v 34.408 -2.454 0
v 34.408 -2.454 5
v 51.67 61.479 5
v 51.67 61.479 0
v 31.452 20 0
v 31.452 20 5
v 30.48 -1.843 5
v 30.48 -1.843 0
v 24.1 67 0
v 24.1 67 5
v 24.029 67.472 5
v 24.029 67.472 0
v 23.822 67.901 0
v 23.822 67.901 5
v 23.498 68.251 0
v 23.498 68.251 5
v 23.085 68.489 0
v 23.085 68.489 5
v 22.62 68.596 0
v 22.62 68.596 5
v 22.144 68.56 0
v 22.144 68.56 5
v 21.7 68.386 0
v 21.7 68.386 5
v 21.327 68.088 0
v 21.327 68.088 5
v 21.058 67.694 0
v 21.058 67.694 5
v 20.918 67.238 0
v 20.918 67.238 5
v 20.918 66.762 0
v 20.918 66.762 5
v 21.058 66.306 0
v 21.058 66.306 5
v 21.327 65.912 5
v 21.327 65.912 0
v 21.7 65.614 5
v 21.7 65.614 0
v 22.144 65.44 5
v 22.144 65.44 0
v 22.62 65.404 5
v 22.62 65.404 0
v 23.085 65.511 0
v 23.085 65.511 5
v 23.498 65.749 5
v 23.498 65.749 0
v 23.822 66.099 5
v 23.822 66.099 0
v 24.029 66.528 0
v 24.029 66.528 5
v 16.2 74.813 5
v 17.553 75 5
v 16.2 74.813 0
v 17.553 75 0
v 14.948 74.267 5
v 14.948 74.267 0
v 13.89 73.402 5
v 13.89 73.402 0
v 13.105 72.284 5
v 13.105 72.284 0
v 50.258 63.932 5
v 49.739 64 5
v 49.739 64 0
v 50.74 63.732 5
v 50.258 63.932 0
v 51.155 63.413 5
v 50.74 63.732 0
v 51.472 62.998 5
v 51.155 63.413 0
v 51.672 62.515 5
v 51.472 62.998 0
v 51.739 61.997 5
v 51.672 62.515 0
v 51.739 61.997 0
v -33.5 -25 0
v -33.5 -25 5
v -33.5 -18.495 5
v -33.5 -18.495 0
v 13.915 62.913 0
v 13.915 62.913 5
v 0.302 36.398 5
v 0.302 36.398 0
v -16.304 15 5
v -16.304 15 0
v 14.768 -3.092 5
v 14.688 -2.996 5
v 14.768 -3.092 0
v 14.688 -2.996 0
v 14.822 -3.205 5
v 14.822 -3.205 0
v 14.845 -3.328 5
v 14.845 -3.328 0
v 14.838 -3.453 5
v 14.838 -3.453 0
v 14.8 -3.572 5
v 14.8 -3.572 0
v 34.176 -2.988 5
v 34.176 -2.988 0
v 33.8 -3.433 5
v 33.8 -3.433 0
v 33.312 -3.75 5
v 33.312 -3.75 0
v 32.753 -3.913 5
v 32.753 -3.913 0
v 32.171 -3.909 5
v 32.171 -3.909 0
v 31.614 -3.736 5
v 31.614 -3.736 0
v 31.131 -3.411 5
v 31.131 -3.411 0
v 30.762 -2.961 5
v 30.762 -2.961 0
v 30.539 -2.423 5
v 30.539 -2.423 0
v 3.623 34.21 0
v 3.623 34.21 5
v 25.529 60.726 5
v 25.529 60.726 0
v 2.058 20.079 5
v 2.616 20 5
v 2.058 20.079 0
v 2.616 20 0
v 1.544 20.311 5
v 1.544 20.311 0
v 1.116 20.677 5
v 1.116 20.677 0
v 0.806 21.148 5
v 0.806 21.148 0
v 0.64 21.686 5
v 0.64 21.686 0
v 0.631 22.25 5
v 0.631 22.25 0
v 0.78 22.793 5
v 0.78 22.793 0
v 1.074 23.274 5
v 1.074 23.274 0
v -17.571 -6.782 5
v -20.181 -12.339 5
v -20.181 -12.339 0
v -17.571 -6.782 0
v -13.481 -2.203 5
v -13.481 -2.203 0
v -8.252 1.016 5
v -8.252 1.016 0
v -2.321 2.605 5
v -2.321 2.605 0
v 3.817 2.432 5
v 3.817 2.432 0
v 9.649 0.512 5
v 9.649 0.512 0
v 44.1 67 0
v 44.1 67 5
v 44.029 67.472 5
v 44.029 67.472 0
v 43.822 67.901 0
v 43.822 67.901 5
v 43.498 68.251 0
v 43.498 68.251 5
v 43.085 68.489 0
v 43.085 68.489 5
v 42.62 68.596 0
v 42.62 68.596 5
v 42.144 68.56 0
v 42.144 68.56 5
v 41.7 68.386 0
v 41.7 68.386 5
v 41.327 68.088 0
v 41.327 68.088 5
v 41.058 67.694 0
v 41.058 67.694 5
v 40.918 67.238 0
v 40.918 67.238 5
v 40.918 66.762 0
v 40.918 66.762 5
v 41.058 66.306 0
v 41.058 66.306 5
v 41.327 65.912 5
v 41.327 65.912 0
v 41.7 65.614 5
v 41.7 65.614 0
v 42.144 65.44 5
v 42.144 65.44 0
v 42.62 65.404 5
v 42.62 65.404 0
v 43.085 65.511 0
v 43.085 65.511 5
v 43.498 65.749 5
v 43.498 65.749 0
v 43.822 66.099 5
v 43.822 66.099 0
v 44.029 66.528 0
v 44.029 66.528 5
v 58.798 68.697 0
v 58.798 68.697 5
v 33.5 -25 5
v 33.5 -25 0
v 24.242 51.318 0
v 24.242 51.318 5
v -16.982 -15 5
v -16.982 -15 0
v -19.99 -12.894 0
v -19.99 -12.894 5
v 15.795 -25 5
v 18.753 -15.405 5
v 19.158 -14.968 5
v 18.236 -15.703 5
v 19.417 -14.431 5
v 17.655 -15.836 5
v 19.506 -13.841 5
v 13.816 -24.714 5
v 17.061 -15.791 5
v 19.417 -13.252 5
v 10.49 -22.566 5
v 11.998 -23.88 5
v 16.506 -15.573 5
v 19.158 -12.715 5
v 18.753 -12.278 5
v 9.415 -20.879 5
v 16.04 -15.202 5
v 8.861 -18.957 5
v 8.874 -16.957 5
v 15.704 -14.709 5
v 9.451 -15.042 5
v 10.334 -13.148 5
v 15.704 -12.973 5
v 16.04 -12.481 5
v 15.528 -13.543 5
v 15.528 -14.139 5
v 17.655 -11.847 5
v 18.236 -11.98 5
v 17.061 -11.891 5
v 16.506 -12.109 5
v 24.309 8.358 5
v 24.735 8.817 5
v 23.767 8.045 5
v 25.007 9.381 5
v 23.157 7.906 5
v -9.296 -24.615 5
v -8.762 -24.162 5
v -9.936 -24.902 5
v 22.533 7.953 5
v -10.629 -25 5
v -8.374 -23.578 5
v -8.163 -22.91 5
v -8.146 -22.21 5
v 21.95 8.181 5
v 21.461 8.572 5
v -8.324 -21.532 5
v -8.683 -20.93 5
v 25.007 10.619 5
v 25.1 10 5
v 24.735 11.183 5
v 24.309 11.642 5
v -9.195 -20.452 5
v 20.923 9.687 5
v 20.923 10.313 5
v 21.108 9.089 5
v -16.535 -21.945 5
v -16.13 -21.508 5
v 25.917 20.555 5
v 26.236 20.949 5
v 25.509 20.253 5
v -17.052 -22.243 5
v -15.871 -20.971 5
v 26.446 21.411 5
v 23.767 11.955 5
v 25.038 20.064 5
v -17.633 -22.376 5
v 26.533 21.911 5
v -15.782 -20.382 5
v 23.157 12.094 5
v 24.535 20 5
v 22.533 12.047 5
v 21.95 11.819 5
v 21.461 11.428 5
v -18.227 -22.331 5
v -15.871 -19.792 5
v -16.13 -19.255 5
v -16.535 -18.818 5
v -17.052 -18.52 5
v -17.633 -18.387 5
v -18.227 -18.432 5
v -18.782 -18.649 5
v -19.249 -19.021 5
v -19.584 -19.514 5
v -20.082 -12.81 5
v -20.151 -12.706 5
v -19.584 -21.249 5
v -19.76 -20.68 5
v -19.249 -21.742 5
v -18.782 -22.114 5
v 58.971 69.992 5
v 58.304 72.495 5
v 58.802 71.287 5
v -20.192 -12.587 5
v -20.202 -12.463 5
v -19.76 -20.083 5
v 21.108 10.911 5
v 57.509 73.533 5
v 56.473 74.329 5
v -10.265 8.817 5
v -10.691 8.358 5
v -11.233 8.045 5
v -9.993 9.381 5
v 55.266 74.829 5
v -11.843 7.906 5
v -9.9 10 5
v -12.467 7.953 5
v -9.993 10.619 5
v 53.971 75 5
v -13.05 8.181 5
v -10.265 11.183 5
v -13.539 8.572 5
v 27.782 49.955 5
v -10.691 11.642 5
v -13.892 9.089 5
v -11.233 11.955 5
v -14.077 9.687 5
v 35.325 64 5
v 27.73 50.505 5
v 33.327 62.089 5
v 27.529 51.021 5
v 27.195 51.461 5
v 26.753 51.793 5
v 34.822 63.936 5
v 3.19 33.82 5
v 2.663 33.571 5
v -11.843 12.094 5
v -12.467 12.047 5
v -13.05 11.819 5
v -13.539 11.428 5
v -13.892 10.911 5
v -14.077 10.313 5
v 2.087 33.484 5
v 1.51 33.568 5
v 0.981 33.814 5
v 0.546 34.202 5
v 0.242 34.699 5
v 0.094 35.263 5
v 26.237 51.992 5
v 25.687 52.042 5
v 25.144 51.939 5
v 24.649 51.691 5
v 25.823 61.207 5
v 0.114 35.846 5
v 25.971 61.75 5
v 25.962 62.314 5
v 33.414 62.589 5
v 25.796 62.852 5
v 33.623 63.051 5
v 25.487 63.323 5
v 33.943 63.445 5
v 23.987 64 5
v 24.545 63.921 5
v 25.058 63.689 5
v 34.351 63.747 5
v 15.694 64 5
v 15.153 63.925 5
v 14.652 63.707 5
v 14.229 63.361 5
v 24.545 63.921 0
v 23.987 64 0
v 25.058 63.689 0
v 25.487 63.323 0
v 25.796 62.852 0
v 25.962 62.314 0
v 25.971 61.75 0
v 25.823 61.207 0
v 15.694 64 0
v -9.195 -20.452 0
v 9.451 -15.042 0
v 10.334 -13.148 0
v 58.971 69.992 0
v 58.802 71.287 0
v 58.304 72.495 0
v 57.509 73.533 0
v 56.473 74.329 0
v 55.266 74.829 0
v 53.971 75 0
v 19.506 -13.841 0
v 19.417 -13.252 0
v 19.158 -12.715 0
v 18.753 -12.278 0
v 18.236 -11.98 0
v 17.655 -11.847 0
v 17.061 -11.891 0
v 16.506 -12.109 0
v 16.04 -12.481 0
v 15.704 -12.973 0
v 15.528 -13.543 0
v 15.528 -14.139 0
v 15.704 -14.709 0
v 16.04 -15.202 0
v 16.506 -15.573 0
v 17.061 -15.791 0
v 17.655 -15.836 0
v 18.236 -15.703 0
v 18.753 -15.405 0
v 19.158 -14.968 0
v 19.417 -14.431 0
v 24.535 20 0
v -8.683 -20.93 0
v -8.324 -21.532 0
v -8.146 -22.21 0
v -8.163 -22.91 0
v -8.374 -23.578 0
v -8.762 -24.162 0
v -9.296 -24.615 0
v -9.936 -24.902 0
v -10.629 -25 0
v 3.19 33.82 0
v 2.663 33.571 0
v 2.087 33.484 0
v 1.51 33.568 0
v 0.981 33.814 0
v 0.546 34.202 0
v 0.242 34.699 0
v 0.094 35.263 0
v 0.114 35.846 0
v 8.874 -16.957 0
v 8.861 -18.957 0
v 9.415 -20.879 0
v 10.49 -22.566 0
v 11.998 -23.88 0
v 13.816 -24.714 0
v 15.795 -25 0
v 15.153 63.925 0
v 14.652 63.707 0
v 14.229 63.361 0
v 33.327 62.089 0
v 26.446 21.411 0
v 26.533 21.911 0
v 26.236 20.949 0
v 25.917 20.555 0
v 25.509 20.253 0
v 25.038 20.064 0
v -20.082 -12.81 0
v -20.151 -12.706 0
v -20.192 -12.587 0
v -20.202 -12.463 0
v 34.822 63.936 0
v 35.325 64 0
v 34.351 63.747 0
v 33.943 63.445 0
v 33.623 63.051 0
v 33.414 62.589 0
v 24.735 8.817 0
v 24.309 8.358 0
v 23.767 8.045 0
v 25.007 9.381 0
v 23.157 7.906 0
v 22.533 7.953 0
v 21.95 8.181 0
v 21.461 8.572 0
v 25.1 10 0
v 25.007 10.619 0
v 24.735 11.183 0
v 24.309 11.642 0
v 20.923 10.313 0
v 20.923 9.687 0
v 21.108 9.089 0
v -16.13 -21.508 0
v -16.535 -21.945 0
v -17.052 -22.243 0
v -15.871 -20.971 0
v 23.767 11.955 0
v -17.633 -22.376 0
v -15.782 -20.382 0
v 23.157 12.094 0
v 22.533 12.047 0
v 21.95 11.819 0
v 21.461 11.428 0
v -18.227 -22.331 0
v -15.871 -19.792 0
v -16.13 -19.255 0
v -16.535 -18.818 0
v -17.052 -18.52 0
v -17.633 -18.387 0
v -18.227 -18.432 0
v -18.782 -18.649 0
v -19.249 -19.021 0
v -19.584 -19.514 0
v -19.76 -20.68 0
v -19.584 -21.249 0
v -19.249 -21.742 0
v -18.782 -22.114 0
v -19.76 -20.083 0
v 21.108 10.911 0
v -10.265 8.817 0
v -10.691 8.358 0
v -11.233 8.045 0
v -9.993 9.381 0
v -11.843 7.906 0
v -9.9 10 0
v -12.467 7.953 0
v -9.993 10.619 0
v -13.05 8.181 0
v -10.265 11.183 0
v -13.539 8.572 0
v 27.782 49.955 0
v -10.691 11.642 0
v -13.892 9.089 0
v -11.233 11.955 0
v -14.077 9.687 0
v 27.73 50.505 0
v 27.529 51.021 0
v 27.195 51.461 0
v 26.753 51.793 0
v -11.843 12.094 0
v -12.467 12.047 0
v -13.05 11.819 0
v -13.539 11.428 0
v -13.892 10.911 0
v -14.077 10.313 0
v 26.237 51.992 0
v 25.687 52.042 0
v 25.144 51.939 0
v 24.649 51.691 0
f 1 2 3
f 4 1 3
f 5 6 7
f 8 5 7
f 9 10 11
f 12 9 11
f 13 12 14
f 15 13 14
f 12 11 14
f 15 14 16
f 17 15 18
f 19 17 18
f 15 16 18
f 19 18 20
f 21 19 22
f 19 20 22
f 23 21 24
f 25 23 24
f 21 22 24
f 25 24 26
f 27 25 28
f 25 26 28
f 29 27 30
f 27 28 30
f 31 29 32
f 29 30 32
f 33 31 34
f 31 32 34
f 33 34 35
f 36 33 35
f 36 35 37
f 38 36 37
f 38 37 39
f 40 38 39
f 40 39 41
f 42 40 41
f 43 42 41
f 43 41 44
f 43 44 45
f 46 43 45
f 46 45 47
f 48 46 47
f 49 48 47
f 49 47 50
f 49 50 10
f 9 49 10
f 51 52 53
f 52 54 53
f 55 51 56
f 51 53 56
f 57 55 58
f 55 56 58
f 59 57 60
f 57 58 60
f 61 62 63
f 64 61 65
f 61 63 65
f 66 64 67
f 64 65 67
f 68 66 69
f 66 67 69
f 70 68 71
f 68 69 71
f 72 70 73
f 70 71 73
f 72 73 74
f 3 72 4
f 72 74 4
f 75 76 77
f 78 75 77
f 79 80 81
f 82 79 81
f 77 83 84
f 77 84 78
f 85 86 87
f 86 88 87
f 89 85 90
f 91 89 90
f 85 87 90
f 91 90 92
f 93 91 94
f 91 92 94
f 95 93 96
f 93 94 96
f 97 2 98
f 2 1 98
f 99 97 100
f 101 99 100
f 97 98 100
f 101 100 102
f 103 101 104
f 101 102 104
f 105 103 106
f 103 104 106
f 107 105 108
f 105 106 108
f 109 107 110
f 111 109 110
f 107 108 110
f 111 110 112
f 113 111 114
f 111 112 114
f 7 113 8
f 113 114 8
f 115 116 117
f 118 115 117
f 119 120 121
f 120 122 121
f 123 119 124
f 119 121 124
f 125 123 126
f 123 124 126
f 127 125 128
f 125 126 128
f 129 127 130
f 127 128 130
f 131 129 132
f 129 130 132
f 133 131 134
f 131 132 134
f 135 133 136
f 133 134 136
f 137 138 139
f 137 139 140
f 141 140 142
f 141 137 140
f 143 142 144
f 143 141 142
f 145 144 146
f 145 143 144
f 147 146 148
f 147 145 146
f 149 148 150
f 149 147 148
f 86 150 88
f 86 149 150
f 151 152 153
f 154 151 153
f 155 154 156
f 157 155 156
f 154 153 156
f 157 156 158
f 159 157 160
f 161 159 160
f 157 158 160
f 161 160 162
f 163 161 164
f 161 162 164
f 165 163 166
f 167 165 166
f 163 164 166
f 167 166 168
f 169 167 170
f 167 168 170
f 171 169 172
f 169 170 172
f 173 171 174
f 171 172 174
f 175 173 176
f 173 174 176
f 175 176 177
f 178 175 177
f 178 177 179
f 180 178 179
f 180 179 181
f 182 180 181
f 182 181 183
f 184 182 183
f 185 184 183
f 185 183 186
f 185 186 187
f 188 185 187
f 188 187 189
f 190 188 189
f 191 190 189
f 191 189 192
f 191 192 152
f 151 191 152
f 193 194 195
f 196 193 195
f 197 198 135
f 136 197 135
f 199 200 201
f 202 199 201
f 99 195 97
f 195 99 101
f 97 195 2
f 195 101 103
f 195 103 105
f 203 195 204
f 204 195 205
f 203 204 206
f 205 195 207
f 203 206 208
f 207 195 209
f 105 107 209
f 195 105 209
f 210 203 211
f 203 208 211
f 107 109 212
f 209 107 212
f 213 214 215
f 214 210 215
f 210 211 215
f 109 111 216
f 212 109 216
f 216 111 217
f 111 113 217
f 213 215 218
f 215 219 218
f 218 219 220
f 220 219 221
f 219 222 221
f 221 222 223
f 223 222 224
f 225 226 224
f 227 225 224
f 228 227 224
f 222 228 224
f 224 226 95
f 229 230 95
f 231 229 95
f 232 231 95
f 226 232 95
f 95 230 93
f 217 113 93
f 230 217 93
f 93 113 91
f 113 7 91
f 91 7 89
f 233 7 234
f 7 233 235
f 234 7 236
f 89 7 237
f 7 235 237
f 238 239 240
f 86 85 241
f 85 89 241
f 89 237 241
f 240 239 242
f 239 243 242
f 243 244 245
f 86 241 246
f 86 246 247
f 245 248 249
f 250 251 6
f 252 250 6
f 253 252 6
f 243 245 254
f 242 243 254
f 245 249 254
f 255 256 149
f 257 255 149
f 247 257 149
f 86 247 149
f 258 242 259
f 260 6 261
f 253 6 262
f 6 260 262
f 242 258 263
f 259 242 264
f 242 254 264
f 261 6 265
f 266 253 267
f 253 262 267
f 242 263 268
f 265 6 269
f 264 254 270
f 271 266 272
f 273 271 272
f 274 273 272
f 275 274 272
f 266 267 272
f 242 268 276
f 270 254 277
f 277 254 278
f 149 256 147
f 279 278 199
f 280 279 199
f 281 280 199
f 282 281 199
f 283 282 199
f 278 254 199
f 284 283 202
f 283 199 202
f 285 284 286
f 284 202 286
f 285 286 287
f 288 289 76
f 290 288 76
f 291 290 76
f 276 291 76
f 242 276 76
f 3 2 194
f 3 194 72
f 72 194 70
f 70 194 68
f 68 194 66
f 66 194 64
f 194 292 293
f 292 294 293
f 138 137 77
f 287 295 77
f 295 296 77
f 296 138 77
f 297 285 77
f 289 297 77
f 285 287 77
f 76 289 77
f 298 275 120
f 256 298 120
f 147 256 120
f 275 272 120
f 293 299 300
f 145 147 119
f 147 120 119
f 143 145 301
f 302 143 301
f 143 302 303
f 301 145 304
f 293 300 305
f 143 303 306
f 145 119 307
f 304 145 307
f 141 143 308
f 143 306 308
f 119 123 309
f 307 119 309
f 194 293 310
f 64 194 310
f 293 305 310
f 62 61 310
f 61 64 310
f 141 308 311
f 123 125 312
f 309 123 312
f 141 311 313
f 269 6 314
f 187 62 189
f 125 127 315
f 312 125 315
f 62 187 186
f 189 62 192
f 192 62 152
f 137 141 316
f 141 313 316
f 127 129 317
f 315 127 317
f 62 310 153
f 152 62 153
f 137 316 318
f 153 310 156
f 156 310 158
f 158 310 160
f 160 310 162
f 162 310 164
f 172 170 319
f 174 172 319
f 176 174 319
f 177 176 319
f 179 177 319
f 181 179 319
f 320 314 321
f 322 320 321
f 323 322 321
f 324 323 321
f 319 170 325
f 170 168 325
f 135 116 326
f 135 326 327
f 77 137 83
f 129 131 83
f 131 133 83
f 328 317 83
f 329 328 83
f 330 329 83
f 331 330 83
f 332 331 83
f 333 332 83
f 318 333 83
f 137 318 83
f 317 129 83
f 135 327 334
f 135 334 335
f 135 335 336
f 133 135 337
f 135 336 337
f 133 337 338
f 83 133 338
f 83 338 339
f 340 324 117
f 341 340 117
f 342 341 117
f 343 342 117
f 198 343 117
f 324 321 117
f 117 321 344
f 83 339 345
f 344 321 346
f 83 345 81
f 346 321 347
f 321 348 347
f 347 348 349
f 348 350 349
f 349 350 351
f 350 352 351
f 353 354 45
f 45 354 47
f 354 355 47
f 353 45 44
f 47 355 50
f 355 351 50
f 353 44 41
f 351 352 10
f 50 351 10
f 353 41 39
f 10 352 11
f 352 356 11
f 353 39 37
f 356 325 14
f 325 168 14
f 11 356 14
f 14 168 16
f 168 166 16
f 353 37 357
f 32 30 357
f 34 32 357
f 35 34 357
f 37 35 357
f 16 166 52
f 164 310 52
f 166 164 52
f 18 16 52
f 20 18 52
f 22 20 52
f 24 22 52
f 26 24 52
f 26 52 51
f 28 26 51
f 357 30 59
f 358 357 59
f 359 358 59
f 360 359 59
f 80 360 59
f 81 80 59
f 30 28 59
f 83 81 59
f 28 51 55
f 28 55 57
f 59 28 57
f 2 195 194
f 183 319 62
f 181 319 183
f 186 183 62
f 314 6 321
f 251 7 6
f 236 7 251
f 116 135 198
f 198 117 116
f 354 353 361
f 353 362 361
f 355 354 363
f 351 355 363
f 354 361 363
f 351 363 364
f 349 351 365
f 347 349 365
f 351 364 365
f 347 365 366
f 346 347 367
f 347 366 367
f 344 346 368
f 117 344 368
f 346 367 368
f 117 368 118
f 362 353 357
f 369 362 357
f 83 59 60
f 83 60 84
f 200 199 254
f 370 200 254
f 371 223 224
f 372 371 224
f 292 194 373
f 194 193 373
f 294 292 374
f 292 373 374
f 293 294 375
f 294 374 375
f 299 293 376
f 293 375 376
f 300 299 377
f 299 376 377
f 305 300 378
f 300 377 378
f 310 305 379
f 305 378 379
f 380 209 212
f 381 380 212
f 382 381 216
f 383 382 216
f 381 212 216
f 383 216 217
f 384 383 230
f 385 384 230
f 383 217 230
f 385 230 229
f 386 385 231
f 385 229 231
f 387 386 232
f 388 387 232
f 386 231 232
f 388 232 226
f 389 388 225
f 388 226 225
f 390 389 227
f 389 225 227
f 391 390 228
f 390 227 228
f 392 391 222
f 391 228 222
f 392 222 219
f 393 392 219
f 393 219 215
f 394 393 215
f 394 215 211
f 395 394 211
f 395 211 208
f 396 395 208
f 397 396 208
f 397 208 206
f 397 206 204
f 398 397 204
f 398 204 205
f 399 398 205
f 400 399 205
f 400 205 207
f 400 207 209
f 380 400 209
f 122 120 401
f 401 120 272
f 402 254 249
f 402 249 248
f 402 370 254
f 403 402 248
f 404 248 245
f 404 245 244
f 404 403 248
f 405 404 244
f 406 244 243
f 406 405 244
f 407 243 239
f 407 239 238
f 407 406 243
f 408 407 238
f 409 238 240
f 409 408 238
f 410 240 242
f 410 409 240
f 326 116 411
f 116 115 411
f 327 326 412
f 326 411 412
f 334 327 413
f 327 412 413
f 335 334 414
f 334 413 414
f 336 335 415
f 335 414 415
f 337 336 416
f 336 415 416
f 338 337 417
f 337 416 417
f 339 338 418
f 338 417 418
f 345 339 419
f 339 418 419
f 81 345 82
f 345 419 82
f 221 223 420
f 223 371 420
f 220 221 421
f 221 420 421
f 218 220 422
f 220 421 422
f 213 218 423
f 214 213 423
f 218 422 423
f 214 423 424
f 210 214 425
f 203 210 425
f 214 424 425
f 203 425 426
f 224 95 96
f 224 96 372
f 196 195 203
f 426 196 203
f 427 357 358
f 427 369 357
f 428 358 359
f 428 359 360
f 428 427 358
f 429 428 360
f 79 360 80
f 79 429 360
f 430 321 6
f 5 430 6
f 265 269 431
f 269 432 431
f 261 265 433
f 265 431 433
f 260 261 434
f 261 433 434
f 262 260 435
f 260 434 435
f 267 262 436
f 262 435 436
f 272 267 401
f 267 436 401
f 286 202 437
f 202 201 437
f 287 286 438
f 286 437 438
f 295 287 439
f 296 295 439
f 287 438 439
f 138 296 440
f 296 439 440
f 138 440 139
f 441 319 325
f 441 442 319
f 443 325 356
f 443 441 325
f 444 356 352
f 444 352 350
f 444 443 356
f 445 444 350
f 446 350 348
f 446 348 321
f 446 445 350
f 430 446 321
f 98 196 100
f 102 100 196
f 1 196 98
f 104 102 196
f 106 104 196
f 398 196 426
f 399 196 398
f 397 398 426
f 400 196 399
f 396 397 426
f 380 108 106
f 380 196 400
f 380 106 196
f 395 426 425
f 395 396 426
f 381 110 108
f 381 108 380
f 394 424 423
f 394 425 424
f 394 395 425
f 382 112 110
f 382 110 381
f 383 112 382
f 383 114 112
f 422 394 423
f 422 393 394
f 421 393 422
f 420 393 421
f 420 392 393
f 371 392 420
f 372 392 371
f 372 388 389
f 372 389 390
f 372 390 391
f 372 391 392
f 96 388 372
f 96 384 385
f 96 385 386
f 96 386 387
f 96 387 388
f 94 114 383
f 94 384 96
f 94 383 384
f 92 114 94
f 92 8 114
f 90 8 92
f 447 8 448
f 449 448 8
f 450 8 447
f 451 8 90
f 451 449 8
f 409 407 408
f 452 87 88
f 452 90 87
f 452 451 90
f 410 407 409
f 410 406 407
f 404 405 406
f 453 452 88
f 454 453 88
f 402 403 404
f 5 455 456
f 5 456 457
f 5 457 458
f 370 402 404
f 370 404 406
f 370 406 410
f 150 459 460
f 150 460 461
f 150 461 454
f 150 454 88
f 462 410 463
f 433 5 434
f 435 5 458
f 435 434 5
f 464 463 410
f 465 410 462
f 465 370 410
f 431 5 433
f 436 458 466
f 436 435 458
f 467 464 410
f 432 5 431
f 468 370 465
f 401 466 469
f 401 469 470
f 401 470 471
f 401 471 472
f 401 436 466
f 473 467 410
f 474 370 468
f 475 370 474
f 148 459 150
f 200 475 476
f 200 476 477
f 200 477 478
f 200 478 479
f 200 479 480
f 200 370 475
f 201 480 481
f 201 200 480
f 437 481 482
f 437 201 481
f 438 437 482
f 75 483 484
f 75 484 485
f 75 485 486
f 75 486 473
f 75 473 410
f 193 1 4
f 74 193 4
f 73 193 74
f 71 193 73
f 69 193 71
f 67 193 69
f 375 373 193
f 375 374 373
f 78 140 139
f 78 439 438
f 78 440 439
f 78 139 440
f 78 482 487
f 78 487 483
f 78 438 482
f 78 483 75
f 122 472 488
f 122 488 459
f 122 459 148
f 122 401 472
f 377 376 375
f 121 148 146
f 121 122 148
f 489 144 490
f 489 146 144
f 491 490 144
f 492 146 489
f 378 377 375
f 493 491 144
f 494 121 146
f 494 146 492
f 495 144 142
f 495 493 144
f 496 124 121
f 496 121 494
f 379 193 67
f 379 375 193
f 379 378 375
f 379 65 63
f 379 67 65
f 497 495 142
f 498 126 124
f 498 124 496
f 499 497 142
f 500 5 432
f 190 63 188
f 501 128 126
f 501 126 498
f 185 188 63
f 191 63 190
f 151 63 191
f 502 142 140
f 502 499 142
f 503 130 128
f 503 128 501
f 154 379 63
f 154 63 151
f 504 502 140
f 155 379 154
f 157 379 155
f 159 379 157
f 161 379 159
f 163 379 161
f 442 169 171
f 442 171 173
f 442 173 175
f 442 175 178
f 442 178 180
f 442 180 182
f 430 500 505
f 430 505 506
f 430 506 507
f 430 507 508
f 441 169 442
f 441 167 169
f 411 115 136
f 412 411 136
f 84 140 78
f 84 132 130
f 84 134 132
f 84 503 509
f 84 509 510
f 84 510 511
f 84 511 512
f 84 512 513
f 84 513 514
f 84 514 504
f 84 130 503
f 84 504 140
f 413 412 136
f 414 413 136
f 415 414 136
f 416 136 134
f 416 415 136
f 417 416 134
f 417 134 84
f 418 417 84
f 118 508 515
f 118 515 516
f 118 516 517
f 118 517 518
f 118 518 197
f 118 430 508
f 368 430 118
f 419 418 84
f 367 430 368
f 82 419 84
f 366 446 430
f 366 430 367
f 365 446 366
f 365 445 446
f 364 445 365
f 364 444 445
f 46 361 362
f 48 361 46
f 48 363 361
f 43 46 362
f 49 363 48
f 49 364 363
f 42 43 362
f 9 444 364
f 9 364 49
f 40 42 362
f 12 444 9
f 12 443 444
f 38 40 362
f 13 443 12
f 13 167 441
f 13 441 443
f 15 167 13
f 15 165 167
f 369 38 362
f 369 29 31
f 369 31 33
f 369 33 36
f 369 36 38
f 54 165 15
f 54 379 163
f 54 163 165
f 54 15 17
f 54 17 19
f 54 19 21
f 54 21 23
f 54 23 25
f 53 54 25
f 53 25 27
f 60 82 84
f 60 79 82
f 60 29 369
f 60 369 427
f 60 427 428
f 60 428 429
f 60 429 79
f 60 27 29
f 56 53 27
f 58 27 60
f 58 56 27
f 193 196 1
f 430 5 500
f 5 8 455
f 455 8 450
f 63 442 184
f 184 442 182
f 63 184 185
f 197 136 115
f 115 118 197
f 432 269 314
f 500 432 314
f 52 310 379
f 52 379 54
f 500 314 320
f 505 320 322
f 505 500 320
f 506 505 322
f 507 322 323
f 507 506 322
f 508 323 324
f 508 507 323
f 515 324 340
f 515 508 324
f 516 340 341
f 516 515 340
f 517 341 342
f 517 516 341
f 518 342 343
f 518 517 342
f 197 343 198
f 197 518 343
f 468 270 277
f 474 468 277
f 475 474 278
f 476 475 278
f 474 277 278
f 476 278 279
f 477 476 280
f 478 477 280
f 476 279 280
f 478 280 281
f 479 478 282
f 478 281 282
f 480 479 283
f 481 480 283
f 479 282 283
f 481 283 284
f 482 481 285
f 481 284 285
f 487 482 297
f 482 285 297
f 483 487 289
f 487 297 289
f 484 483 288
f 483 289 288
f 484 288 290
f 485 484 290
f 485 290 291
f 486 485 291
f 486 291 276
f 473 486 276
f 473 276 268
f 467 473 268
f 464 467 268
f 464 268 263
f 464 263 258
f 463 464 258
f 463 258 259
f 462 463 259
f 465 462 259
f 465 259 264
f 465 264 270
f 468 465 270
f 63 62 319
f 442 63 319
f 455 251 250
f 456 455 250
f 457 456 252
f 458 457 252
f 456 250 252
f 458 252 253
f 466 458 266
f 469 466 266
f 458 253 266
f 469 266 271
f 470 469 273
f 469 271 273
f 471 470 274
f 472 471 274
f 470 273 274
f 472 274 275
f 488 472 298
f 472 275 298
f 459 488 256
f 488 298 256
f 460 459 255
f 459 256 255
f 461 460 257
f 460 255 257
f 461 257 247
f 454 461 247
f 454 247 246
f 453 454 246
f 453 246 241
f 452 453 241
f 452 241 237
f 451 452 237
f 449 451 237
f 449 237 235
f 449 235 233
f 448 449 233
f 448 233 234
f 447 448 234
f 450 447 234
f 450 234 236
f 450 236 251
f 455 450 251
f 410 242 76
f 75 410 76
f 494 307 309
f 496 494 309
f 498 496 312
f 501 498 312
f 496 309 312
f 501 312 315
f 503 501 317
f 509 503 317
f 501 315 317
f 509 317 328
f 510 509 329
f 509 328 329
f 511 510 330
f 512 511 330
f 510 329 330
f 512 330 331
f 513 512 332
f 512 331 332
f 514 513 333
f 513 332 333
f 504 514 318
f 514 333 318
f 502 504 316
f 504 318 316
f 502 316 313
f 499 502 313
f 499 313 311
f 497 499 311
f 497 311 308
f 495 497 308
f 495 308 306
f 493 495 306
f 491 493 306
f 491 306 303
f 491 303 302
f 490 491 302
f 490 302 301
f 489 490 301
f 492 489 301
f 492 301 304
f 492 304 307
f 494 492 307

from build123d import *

# Parameters (mm, degrees)
SKETCH_1_W          = 67
SKETCH_1_H          = 30
EXTRUDE_1_DEPTH     = 5
SKETCH_3_R          = 11.5
CUT_EXTRUDE_1_DEPTH = 6
CUT_EXTRUDE_2_DEPTH = 5
EXTRUDE_2_DEPTH     = 5
FILLET_1_R          = 2.5
FILLET_3_R          = 0.5
FILLET_4_R          = 7
SKETCH_6_R          = 2
CUT_EXTRUDE_3_DEPTH = 6
EXTRUDE_3_DEPTH     = 5
CUT_EXTRUDE_4_DEPTH = 6
EXTRUDE_4_DEPTH     = 5
SKETCH_10_R         = 2.1
CUT_EXTRUDE_5_DEPTH = 6
FILLET_5_R          = 5
SKETCH_11_R         = 1.6
CUT_EXTRUDE_6_DEPTH = 6
CUT_EXTRUDE_7_DEPTH = 10
FILLET_6_R          = 2


with BuildPart() as part:
    # 草图1 → 凸台-拉伸1 (new body)
    with BuildSketch(Plane.XY):
        Rectangle(SKETCH_1_W, SKETCH_1_H)
    extrude(amount=EXTRUDE_1_DEPTH)

    # 草图3 → 切除-拉伸1 (cut, through all)
    with BuildSketch(Plane.XY.offset(5)):
        with Locations((0.155997342, -18.5)):
            Circle(SKETCH_3_R)
    extrude(amount=-CUT_EXTRUDE_1_DEPTH, mode=Mode.SUBTRACT)

    # 草图4 → 切除-拉伸2 (cut)
    with BuildSketch(Plane.XY.offset(5)):
        with BuildLine():
            Line((14.951296016, -3.246749948), (0.155997342, -34.975370344))
            Line((0.155997342, -34.975370344), (0.155997342, -27))
            Line((0.155997342, -27), (-20.283732192, -12.687947301))
            ThreePointArc((-20.283732192, -12.687947301), (-5.343907366, 2.025923809), (14.951296016, -3.246749948))
        make_face()
    extrude(amount=-CUT_EXTRUDE_2_DEPTH, mode=Mode.SUBTRACT)

    # 草图5 → 凸台-拉伸2 (add)
    with BuildSketch(Plane.XY.offset(5)):
        Polygon((-16.981778738, -15), (-2.700298671, -25), (-33.5, -25), (-33.5, -15), align=None)
        Polygon((33.5, -15), (33.5, -25), (4.807588927, -25), (10.334473164, -13.147558505), align=None)
    extrude(amount=-EXTRUDE_2_DEPTH)

    # 圆角1
    fillet_1_edges = [part.edges().sort_by_distance(p)[0] for p in [
        (-2.700298671, -25, 2.5),
    ]]
    fillet(fillet_1_edges, radius=FILLET_1_R)

    # 圆角3
    fillet_3_edges = [part.edges().sort_by_distance(p)[0] for p in [
        (14.951296016, -3.246749948, 2.5),
        (-20.283732192, -12.687947301, 2.5),
    ]]
    fillet(fillet_3_edges, radius=FILLET_3_R)

    # 圆角4
    fillet_4_edges = [part.edges().sort_by_distance(p)[0] for p in [
        (4.807588927, -25, 2.5),
    ]]
    fillet(fillet_4_edges, radius=FILLET_4_R)

    # 草图6 → 切除-拉伸3 (cut, through all)
    with BuildSketch(Plane.XY.offset(5)):
        with Locations((17.505658254, -13.841257188)):
            Circle(SKETCH_6_R)
        with Locations((-17.782400736, -20.381512339)):
            Circle(SKETCH_6_R)
    extrude(amount=-CUT_EXTRUDE_3_DEPTH, mode=Mode.SUBTRACT)

    # 草图7 → 凸台-拉伸3 (add)
    with BuildSketch(Plane.XY.offset(5)):
        Polygon((60.5, 75), (14.5, 75), (-16.303792618, 15), (33.5, 15), align=None)
    extrude(amount=-EXTRUDE_3_DEPTH)

    # 草图8 → 切除-拉伸4 (cut, through all)
    with BuildSketch(Plane.XY.offset(5)):
        Polygon((-16.303792618, 15), (-33.5, -18.49498082), (-33.5, 15), align=None)
    extrude(amount=-CUT_EXTRUDE_4_DEPTH, mode=Mode.SUBTRACT)

    # 草图9 → 凸台-拉伸4 (add)
    with BuildSketch(Plane.XY.offset(5)):
        Polygon((60.5, 75), (33.5, -25), (33.5, 15), align=None)
    extrude(amount=-EXTRUDE_4_DEPTH)

    # 草图10 → 切除-拉伸5 (cut, through all)
    with BuildSketch(Plane.XY.offset(5)):
        with Locations((-12, 10)):
            Circle(SKETCH_10_R)
        with Locations((23, 10)):
            Circle(SKETCH_10_R)
    extrude(amount=-CUT_EXTRUDE_5_DEPTH, mode=Mode.SUBTRACT)

    # 圆角5
    fillet_5_edges = [part.edges().sort_by_distance(p)[0] for p in [
        (60.5, 75, 2.5),
        (14.5, 75, 2.5),
    ]]
    fillet(fillet_5_edges, radius=FILLET_5_R)

    # 草图11 → 切除-拉伸6 (cut, through all)
    with BuildSketch(Plane.XY.offset(5)):
        with Locations((42.500000039, 67)):
            Circle(SKETCH_11_R)
        with Locations((22.500000039, 67)):
            Circle(SKETCH_11_R)
    extrude(amount=-CUT_EXTRUDE_6_DEPTH, mode=Mode.SUBTRACT)

    # 草图12 → 切除-拉伸7 (cut)
    with BuildSketch(Plane.XY.offset(5)):
        Polygon((33.412019277, 64), (31.452414539, 20), (29.670955687, -20), (52.350955687, 64), align=None)
        Polygon((28.047412755, 55.924590701), (-1.630833947, 20), (26.447458252, 20), align=None)
        Polygon((14.473082867, 64), (-8.116365053, 20), (28.233189094, 64), align=None)
    extrude(amount=-CUT_EXTRUDE_7_DEPTH, mode=Mode.SUBTRACT)

    # 圆角6
    fillet_6_edges = [part.edges().sort_by_distance(p)[0] for p in [
        (29.670955687, -20, 2.5),
        (33.412019277, 64, 2.5),
        (52.350955687, 64, 2.5),
        (14.473082867, 64, 2.5),
        (28.233189094, 64, 2.5),
        (-8.116365053, 20, 2.5),
        (28.047412755, 55.924590701, 2.5),
        (26.447458252, 20, 2.5),
        (-1.630833947, 20, 2.5),
    ]]
    fillet(fillet_6_edges, radius=FILLET_6_R)


solid = part.part
